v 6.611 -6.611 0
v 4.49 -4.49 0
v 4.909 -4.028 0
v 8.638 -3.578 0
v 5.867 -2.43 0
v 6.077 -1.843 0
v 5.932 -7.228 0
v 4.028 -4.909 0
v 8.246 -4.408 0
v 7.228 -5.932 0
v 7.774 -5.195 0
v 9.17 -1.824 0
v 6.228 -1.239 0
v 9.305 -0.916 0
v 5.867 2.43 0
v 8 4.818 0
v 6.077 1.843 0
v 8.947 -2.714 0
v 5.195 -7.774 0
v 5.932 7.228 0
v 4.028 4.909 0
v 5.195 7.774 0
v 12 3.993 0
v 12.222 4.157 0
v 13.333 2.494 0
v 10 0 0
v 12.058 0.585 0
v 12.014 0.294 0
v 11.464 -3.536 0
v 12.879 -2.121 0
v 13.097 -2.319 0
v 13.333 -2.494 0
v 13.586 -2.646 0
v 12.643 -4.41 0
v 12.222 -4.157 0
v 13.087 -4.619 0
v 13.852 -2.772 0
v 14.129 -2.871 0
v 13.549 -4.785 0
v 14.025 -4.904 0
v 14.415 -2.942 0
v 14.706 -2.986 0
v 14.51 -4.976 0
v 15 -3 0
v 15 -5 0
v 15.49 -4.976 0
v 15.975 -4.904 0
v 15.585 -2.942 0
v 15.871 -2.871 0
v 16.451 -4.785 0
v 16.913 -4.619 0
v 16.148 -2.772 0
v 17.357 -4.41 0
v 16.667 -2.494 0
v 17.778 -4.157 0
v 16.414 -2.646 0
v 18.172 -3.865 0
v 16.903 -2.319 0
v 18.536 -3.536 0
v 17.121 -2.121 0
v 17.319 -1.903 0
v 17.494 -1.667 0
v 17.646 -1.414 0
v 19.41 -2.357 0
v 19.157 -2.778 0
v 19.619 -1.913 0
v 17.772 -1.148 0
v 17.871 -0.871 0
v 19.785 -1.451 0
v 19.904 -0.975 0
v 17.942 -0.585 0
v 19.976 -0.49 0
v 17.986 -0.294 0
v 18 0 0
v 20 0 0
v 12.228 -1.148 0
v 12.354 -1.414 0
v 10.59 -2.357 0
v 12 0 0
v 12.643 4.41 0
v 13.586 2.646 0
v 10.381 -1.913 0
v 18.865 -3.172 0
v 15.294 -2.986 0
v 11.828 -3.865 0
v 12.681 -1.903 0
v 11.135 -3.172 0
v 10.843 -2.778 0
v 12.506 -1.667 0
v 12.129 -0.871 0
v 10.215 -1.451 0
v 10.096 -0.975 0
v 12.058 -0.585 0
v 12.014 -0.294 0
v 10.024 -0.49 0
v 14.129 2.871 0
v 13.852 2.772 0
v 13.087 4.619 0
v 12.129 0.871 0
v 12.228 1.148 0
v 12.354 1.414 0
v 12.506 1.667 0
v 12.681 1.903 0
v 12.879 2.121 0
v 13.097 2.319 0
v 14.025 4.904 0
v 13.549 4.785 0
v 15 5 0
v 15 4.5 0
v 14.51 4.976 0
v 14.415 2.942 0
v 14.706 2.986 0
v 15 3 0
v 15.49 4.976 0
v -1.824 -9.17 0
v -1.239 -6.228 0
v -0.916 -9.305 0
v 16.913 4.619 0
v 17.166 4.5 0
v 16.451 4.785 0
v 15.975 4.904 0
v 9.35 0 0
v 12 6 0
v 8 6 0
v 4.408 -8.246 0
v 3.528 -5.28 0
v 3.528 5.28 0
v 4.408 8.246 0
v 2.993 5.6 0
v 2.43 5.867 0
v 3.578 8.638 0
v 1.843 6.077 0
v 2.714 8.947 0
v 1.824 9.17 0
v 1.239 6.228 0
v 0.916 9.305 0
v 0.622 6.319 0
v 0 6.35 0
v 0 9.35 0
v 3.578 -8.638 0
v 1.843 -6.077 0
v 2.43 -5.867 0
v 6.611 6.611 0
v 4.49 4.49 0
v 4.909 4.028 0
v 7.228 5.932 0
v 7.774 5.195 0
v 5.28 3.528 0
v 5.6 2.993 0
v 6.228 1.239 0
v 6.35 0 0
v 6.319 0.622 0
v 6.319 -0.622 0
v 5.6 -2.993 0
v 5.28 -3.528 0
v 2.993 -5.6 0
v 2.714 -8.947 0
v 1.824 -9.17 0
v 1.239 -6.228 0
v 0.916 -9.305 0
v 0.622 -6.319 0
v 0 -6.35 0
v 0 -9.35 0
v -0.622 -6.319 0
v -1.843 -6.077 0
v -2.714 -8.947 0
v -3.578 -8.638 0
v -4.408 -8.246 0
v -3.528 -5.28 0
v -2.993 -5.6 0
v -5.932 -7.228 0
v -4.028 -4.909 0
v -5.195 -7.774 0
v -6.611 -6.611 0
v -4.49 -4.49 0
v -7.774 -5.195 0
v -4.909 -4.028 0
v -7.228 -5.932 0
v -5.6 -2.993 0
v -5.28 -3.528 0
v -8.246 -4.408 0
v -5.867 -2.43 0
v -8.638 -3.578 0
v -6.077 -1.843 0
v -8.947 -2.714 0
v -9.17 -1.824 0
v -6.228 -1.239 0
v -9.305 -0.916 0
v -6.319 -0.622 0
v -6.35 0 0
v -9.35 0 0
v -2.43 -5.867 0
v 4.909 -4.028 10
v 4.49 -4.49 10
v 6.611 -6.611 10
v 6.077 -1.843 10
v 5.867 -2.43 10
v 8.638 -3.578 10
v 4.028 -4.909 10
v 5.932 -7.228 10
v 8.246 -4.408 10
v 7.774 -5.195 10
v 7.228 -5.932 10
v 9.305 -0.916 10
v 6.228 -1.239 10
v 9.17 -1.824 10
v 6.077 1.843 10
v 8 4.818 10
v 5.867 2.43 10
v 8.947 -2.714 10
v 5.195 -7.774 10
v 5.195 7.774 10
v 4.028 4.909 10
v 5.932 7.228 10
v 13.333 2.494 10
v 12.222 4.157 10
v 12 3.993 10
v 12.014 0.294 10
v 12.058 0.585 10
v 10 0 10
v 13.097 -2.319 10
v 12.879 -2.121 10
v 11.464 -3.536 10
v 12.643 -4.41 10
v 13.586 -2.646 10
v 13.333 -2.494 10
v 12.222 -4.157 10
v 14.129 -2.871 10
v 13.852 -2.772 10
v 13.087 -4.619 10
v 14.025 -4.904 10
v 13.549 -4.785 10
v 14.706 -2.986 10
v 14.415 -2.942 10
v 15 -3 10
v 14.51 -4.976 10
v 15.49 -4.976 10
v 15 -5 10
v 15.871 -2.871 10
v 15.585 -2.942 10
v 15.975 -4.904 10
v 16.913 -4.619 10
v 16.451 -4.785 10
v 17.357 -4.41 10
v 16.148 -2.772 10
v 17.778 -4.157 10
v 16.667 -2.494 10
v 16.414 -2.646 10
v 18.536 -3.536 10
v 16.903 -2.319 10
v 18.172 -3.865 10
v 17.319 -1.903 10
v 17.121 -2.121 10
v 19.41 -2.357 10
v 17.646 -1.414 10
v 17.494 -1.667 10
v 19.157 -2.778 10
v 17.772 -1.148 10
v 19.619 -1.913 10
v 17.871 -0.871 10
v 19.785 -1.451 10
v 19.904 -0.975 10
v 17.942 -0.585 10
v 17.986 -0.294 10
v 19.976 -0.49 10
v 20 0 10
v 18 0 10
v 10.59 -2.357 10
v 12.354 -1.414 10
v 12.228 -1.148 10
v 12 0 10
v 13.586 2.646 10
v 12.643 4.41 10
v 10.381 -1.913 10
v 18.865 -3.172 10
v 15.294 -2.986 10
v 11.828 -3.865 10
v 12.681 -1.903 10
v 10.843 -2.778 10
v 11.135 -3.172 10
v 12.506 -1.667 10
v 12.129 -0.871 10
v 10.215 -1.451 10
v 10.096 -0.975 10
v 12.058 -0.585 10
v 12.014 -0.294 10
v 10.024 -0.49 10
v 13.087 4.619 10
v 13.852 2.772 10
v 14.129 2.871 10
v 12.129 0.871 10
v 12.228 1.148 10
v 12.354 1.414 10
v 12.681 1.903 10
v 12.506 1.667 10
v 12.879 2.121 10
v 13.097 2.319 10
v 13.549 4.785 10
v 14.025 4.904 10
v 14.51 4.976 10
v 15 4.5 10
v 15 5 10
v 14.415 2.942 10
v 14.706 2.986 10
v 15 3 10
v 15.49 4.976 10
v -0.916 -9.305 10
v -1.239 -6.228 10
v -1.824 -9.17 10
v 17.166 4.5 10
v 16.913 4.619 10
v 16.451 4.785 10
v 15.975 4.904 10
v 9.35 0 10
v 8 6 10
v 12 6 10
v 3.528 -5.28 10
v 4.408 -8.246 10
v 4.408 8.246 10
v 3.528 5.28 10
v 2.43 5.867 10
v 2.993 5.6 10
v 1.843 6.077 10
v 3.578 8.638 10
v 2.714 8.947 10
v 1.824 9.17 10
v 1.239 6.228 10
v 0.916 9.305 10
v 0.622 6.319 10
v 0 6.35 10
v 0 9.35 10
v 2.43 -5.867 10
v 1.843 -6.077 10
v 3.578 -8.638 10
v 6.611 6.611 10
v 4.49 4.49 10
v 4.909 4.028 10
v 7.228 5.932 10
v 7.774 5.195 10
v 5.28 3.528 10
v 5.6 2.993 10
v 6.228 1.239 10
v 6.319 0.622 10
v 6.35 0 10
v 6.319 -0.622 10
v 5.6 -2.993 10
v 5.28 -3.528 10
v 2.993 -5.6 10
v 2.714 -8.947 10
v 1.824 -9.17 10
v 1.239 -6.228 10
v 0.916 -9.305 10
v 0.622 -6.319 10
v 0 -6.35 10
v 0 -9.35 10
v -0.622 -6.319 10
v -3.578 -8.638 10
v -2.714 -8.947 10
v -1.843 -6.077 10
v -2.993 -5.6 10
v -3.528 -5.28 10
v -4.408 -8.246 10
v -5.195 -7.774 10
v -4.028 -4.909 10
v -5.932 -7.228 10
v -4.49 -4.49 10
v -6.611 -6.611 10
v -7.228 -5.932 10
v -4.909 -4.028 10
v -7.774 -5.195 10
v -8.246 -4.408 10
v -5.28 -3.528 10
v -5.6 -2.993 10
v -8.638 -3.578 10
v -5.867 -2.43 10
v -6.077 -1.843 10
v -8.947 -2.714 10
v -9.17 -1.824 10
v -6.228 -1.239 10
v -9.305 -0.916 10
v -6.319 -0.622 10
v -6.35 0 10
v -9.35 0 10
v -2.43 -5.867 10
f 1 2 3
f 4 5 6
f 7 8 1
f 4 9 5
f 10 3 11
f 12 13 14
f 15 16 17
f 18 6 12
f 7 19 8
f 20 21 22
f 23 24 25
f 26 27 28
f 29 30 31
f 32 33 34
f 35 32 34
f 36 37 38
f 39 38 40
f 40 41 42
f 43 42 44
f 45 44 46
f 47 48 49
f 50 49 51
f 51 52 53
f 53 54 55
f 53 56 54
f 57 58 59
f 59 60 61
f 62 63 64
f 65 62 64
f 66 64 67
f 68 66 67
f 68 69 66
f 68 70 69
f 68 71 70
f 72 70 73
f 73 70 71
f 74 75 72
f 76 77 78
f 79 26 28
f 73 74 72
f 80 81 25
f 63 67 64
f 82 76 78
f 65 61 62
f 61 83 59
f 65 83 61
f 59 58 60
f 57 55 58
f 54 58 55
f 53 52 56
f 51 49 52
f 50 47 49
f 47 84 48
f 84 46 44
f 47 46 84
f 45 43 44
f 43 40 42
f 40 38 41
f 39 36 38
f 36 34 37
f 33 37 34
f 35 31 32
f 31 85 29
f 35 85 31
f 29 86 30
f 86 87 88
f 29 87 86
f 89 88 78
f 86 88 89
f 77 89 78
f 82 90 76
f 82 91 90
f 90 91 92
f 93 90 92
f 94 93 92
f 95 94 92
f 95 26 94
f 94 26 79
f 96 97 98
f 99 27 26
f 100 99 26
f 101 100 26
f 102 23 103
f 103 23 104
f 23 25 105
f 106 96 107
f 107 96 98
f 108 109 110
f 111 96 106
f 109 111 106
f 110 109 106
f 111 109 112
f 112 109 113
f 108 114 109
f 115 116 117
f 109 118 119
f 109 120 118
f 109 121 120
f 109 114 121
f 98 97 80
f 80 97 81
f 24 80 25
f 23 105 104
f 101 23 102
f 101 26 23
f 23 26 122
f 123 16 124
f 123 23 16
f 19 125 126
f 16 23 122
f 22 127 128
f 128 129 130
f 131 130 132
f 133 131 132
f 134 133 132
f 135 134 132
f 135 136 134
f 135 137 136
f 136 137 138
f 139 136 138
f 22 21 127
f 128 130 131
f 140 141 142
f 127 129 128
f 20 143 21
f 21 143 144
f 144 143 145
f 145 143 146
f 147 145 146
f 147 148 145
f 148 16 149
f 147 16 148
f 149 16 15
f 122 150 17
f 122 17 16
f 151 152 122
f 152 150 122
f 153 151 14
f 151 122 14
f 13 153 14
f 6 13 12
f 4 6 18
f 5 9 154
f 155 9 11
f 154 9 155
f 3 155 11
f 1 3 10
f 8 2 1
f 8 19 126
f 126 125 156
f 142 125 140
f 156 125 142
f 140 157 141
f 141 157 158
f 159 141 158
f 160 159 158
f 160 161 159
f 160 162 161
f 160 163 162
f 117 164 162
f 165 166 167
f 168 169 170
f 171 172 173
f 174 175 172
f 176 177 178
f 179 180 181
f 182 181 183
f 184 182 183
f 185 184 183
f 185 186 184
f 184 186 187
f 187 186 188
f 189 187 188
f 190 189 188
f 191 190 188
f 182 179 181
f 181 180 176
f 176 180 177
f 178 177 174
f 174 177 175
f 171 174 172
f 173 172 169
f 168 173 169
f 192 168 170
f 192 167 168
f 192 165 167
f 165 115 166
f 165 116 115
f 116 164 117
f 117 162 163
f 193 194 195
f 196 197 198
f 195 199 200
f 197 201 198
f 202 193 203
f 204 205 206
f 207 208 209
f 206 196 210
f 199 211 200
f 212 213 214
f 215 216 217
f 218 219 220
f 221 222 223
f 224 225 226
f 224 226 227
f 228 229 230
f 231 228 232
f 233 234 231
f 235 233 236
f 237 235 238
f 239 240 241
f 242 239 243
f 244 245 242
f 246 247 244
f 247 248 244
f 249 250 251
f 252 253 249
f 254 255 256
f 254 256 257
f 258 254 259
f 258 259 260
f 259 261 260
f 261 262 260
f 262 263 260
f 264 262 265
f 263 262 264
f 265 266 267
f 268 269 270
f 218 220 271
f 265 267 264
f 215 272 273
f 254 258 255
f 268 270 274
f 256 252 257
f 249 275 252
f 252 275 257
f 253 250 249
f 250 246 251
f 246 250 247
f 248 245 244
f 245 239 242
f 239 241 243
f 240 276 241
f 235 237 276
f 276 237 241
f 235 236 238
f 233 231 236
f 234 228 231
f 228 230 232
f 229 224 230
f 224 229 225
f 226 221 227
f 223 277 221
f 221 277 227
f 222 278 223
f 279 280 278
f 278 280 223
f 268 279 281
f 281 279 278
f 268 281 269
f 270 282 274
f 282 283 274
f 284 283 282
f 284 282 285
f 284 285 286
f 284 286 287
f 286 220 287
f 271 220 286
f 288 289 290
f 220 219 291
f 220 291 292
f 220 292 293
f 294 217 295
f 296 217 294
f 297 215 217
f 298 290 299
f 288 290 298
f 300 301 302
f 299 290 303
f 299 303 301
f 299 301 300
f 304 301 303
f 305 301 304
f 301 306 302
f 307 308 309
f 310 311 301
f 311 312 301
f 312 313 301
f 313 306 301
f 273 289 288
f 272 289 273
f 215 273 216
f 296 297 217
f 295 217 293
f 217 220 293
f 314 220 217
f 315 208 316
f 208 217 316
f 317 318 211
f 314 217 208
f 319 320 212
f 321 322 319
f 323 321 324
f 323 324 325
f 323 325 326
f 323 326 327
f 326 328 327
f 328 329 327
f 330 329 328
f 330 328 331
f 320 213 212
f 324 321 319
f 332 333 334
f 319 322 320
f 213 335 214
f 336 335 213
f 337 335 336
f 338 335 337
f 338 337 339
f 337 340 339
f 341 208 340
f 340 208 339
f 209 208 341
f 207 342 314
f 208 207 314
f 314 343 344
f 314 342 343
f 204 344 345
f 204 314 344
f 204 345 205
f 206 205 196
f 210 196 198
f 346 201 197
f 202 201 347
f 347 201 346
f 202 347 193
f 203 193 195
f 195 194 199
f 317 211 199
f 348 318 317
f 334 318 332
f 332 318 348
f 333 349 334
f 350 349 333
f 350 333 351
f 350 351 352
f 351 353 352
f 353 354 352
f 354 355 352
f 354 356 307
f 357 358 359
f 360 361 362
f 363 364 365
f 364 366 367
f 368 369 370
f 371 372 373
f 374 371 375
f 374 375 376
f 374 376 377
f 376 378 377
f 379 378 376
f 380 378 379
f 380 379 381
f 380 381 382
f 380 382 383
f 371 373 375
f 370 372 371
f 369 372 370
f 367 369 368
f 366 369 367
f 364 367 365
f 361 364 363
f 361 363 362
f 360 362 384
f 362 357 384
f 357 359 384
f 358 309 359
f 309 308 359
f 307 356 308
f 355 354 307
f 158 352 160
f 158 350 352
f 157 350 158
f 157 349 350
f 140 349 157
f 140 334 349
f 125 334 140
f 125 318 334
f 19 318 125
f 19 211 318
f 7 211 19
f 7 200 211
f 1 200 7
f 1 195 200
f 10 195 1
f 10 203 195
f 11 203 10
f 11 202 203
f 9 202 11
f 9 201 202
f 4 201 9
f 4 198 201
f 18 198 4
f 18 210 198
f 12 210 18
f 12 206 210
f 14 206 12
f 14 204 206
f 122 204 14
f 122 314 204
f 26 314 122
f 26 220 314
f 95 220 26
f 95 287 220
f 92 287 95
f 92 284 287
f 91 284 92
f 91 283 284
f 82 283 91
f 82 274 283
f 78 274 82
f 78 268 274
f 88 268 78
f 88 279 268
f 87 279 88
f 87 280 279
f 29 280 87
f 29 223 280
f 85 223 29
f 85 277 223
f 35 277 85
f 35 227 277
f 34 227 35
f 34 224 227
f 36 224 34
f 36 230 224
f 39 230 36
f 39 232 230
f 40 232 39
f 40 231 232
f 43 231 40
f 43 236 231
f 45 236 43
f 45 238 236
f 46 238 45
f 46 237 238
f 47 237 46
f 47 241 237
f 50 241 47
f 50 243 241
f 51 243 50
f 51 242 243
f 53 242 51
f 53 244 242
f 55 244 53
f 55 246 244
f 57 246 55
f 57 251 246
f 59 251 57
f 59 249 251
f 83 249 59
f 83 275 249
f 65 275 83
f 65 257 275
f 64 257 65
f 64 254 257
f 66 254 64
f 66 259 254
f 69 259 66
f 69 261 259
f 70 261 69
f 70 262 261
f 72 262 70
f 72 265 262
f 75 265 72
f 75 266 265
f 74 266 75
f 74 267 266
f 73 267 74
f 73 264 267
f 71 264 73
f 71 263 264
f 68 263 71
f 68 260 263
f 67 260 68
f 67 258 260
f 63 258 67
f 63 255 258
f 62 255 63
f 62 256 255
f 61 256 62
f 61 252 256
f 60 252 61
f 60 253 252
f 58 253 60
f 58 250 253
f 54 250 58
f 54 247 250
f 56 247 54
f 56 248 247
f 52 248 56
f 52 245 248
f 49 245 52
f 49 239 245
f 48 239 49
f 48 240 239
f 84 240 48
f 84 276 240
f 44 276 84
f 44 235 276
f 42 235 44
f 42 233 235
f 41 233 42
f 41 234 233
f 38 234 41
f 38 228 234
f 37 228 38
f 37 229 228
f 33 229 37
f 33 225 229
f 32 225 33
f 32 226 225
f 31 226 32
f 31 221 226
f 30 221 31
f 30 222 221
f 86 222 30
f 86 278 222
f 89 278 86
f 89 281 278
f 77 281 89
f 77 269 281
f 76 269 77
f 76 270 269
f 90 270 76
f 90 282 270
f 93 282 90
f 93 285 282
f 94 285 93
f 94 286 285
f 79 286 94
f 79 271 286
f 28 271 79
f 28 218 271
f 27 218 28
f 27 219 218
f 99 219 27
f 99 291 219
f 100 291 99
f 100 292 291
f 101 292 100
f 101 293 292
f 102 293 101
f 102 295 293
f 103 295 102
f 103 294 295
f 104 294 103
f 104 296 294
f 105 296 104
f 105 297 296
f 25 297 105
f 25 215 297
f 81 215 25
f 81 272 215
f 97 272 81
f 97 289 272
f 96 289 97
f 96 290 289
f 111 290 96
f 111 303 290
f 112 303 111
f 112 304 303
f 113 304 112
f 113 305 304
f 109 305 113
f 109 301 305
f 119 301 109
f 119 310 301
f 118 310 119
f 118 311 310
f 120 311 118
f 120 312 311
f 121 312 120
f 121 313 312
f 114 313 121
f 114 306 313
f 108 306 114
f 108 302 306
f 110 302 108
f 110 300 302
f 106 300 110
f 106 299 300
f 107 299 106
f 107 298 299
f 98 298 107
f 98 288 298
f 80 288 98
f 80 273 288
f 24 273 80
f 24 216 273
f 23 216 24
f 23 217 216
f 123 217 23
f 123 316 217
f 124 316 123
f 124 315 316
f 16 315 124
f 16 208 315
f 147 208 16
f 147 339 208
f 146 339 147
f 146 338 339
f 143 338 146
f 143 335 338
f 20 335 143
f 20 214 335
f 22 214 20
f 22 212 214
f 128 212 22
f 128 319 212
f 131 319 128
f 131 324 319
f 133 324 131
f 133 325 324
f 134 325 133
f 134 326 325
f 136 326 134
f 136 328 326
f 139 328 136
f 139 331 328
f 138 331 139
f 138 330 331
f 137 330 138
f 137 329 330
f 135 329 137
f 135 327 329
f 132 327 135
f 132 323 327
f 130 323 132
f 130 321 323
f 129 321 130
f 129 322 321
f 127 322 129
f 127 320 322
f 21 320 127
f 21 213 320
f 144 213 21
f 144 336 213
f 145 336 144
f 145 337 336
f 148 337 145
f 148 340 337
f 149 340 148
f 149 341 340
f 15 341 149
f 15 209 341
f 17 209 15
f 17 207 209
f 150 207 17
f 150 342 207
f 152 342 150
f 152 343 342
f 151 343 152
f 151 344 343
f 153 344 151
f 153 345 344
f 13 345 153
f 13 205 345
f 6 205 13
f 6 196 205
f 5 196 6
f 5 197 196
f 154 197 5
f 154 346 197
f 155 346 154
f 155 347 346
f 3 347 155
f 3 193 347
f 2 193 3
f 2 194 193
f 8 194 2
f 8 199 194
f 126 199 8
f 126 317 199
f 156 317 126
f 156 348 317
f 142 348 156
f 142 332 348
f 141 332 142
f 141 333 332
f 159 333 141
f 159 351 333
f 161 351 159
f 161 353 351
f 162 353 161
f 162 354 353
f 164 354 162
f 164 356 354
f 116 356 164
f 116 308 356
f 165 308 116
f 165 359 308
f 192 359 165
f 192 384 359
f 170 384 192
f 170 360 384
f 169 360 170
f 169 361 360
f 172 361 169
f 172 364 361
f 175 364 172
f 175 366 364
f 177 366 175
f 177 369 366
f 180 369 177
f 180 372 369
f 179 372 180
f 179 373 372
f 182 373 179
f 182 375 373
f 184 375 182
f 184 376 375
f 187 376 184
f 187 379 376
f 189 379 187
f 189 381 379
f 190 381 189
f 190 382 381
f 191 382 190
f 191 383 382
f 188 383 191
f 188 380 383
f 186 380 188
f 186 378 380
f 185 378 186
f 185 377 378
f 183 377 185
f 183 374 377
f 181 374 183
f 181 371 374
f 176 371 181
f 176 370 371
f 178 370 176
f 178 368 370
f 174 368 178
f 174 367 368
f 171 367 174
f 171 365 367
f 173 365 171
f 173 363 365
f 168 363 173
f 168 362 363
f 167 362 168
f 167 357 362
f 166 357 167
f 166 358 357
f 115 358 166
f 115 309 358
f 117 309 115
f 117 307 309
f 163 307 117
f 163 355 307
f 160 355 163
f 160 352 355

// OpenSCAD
// Snap-on clip for a 12.7 mm lab stand rod, holding a 6 mm tube.
// Printed flat: 10 mm tall extrusion (Z) of a 2-D profile in XY.

// ---- Dimensions (mm) ----
rod_id   = 12.7;   // rod ring inner diameter
rod_wall = 3.0;    // rod ring wall thickness
rod_od   = rod_id + 2*rod_wall;   // 18.7 outer diameter

tube_id  = 6.0;    // tubing ring inner diameter
tube_wall= 2.0;    // tubing ring wall thickness
tube_od  = tube_id + 2*tube_wall; // 10.0 outer diameter

tube_cx  = 15.0;   // tubing ring centre X (Y = 0)

rod_open_w = 10.0; // rod ring opening width (Y)
rod_open_h = 10.0; // rod ring opening height (Z)

tube_open_w = 4.5; // tubing ring opening width (Y)
tube_open_h = 10.0; // tubing ring opening height (Z)

bridge_x0 = 8.0;   // bridge start X
bridge_x1 = 12.0;  // bridge end X
bridge_w  = 6.0;   // bridge width (Y)

extrude_h = 10.0;  // part height (Z)

$fn = 64;

// ---- 2-D profile in XY ----
module profile() { union() {
    // (1) Rod ring: annulus with a 10 mm wide opening on the -X side
    difference() {
        difference() {
            circle(d = rod_od);
            circle(d = rod_id);
        }
        // opening: everything with x < 0 and -5 < y < 5
        translate([-10, 0]) square([10, rod_open_w], center = [true, true]);
    }

    // (2) Tubing ring: annulus with a 4.5 mm wide opening on the +X side
    difference() {
        difference() {
            translate([tube_cx, 0]) circle(d = tube_od);
            translate([tube_cx, 0]) circle(d = tube_id);
        }
        // opening: x > 15 and -2.25 < y < 2.25
        translate([tube_cx, 0]) square([10, tube_open_w], center = [false, true]);
    }

    // (3) Solid bridge joining the two rings (does not block either hole)
    translate([bridge_x0, 0]) square([bridge_x1 - bridge_x0, bridge_w], center = [false, true]);
} }

// ---- Extrude 10 mm in Z (print orientation: rests on XY plane, builds +Z) ----
linear_extrude(height = extrude_h) profile();
